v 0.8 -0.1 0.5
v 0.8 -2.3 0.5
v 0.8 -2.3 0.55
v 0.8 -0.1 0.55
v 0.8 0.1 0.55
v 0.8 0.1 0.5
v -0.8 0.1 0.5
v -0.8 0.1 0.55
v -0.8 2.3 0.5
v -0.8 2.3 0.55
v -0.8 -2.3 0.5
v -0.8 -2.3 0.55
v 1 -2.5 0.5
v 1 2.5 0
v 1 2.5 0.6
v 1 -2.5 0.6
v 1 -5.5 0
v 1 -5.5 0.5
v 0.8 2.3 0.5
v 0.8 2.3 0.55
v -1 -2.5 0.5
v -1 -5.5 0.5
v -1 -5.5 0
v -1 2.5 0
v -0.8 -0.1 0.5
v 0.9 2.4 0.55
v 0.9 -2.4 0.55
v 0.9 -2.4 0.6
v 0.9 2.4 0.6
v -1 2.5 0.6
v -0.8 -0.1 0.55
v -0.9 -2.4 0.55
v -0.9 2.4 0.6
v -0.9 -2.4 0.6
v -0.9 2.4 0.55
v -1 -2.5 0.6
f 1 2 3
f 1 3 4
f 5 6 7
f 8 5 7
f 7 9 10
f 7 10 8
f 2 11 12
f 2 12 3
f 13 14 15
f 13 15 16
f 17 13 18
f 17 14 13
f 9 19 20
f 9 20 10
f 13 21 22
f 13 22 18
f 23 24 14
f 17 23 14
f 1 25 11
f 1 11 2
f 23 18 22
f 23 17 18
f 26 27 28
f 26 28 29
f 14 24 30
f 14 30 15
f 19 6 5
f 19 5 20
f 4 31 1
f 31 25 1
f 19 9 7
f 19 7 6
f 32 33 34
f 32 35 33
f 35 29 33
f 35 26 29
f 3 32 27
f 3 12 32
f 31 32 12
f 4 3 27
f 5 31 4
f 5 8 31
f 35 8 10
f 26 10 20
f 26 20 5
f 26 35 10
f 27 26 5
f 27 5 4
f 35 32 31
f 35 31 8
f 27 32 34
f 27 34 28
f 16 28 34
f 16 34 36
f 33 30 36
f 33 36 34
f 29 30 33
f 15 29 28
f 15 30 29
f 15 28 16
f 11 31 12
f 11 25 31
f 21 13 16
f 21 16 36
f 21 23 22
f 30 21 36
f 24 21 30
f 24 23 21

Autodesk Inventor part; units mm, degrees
ref_plane "YZ Plane" through (0, 0, 0) normal (1, 0, 0) x (0, 1, 0)
ref_plane "XZ Plane" through (0, 0, 0) normal (0, 1, 0) x (-1, 0, 0)
ref_plane "XY Plane" through (0, 0, 0) normal (0, 0, 1) x (1, 0, 0)
sketch "草圖1" plane through (0, 0, 0) normal (0, 0, 1) x (1, 0, 0)
  line L0 (-1, 2.5) -> (1, 2.5)
  line L1 (1, 2.5) -> (1, -2.5)
  line L2 (1, -2.5) -> (-1, -2.5)
  line L3 (-1, -2.5) -> (-1, 2.5)
  line L4 (-1, 2.5) -> (1, -2.5) construction
  line L5 (1, 2.5) -> (-1, -2.5) construction
  line L6 (-0.8, -0.1) -> (0.8, -0.1)
  line L7 (1, -0.1) -> (1, 0.1)
  line L8 (0.8, 0.1) -> (-0.8, 0.1)
  line L9 (-1, 0.1) -> (-1, -0.1)
  line L10 (-1, -0.1) -> (1, 0.1) construction
  line L11 (1, -0.1) -> (-1, 0.1) construction
  line L12 (-0.8, -2.3) -> (0.8, -2.3)
  line L13 (0.8, 2.3) -> (-0.8, 2.3)
  line L14 (-0.8, 2.3) -> (0.8, -2.3) construction
  line L15 (-0.8, -2.3) -> (0.8, 2.3) construction
  line L16 (0.8, -2.3) -> (0.8, -0.08)
  line L17 (0.8, 0.08) -> (0.8, 2.3)
  line L18 (-0.8, 2.3) -> (-0.8, 0.08)
  line L19 (-0.8, -0.08) -> (-0.8, -2.3)
  line L20 (-1, -2.5) -> (1, -2.5)
  line L21 (1, -2.5) -> (1, -5.5)
  line L22 (1, -5.5) -> (-1, -5.5)
  line L23 (-1, -5.5) -> (-1, -2.5)
  line L24 (-0.9, -2.4) -> (0.9, -2.4)
  line L25 (0.9, -2.4) -> (0.9, 2.4)
  line L26 (0.9, 2.4) -> (-0.9, 2.4)
  line L27 (-0.9, 2.4) -> (-0.9, -2.4)
  line L28 (-0.9, -2.4) -> (0.9, 2.4) construction
  line L29 (0.9, -2.4) -> (-0.9, 2.4) construction
  point P0 (0, 0)
  dimension "d0" = 2
  dimension "d1" = 5
  dimension "d4" = 0.2
  dimension "d5" = 4.6
  dimension "d6" = 1.6
  dimension "d7" = 3
  dimension "d12" = 1.8
  dimension "d13" = 4.8
extrude "擠出4" add sketch "草圖1" along normal blind 0.6 contours L0 L1 L2 L3
extrude "擠出5" add sketch "草圖1" along normal blind 0.55 contours L27 L26 L25 L24
extrude "擠出6" add sketch "草圖1" along normal blind 0.5 contours L2 L21 L22 L23 | L6 L16 L12 L19 | L8 L18 L13 L17
properties part number "窗" material "木材 (胡桃木)"
